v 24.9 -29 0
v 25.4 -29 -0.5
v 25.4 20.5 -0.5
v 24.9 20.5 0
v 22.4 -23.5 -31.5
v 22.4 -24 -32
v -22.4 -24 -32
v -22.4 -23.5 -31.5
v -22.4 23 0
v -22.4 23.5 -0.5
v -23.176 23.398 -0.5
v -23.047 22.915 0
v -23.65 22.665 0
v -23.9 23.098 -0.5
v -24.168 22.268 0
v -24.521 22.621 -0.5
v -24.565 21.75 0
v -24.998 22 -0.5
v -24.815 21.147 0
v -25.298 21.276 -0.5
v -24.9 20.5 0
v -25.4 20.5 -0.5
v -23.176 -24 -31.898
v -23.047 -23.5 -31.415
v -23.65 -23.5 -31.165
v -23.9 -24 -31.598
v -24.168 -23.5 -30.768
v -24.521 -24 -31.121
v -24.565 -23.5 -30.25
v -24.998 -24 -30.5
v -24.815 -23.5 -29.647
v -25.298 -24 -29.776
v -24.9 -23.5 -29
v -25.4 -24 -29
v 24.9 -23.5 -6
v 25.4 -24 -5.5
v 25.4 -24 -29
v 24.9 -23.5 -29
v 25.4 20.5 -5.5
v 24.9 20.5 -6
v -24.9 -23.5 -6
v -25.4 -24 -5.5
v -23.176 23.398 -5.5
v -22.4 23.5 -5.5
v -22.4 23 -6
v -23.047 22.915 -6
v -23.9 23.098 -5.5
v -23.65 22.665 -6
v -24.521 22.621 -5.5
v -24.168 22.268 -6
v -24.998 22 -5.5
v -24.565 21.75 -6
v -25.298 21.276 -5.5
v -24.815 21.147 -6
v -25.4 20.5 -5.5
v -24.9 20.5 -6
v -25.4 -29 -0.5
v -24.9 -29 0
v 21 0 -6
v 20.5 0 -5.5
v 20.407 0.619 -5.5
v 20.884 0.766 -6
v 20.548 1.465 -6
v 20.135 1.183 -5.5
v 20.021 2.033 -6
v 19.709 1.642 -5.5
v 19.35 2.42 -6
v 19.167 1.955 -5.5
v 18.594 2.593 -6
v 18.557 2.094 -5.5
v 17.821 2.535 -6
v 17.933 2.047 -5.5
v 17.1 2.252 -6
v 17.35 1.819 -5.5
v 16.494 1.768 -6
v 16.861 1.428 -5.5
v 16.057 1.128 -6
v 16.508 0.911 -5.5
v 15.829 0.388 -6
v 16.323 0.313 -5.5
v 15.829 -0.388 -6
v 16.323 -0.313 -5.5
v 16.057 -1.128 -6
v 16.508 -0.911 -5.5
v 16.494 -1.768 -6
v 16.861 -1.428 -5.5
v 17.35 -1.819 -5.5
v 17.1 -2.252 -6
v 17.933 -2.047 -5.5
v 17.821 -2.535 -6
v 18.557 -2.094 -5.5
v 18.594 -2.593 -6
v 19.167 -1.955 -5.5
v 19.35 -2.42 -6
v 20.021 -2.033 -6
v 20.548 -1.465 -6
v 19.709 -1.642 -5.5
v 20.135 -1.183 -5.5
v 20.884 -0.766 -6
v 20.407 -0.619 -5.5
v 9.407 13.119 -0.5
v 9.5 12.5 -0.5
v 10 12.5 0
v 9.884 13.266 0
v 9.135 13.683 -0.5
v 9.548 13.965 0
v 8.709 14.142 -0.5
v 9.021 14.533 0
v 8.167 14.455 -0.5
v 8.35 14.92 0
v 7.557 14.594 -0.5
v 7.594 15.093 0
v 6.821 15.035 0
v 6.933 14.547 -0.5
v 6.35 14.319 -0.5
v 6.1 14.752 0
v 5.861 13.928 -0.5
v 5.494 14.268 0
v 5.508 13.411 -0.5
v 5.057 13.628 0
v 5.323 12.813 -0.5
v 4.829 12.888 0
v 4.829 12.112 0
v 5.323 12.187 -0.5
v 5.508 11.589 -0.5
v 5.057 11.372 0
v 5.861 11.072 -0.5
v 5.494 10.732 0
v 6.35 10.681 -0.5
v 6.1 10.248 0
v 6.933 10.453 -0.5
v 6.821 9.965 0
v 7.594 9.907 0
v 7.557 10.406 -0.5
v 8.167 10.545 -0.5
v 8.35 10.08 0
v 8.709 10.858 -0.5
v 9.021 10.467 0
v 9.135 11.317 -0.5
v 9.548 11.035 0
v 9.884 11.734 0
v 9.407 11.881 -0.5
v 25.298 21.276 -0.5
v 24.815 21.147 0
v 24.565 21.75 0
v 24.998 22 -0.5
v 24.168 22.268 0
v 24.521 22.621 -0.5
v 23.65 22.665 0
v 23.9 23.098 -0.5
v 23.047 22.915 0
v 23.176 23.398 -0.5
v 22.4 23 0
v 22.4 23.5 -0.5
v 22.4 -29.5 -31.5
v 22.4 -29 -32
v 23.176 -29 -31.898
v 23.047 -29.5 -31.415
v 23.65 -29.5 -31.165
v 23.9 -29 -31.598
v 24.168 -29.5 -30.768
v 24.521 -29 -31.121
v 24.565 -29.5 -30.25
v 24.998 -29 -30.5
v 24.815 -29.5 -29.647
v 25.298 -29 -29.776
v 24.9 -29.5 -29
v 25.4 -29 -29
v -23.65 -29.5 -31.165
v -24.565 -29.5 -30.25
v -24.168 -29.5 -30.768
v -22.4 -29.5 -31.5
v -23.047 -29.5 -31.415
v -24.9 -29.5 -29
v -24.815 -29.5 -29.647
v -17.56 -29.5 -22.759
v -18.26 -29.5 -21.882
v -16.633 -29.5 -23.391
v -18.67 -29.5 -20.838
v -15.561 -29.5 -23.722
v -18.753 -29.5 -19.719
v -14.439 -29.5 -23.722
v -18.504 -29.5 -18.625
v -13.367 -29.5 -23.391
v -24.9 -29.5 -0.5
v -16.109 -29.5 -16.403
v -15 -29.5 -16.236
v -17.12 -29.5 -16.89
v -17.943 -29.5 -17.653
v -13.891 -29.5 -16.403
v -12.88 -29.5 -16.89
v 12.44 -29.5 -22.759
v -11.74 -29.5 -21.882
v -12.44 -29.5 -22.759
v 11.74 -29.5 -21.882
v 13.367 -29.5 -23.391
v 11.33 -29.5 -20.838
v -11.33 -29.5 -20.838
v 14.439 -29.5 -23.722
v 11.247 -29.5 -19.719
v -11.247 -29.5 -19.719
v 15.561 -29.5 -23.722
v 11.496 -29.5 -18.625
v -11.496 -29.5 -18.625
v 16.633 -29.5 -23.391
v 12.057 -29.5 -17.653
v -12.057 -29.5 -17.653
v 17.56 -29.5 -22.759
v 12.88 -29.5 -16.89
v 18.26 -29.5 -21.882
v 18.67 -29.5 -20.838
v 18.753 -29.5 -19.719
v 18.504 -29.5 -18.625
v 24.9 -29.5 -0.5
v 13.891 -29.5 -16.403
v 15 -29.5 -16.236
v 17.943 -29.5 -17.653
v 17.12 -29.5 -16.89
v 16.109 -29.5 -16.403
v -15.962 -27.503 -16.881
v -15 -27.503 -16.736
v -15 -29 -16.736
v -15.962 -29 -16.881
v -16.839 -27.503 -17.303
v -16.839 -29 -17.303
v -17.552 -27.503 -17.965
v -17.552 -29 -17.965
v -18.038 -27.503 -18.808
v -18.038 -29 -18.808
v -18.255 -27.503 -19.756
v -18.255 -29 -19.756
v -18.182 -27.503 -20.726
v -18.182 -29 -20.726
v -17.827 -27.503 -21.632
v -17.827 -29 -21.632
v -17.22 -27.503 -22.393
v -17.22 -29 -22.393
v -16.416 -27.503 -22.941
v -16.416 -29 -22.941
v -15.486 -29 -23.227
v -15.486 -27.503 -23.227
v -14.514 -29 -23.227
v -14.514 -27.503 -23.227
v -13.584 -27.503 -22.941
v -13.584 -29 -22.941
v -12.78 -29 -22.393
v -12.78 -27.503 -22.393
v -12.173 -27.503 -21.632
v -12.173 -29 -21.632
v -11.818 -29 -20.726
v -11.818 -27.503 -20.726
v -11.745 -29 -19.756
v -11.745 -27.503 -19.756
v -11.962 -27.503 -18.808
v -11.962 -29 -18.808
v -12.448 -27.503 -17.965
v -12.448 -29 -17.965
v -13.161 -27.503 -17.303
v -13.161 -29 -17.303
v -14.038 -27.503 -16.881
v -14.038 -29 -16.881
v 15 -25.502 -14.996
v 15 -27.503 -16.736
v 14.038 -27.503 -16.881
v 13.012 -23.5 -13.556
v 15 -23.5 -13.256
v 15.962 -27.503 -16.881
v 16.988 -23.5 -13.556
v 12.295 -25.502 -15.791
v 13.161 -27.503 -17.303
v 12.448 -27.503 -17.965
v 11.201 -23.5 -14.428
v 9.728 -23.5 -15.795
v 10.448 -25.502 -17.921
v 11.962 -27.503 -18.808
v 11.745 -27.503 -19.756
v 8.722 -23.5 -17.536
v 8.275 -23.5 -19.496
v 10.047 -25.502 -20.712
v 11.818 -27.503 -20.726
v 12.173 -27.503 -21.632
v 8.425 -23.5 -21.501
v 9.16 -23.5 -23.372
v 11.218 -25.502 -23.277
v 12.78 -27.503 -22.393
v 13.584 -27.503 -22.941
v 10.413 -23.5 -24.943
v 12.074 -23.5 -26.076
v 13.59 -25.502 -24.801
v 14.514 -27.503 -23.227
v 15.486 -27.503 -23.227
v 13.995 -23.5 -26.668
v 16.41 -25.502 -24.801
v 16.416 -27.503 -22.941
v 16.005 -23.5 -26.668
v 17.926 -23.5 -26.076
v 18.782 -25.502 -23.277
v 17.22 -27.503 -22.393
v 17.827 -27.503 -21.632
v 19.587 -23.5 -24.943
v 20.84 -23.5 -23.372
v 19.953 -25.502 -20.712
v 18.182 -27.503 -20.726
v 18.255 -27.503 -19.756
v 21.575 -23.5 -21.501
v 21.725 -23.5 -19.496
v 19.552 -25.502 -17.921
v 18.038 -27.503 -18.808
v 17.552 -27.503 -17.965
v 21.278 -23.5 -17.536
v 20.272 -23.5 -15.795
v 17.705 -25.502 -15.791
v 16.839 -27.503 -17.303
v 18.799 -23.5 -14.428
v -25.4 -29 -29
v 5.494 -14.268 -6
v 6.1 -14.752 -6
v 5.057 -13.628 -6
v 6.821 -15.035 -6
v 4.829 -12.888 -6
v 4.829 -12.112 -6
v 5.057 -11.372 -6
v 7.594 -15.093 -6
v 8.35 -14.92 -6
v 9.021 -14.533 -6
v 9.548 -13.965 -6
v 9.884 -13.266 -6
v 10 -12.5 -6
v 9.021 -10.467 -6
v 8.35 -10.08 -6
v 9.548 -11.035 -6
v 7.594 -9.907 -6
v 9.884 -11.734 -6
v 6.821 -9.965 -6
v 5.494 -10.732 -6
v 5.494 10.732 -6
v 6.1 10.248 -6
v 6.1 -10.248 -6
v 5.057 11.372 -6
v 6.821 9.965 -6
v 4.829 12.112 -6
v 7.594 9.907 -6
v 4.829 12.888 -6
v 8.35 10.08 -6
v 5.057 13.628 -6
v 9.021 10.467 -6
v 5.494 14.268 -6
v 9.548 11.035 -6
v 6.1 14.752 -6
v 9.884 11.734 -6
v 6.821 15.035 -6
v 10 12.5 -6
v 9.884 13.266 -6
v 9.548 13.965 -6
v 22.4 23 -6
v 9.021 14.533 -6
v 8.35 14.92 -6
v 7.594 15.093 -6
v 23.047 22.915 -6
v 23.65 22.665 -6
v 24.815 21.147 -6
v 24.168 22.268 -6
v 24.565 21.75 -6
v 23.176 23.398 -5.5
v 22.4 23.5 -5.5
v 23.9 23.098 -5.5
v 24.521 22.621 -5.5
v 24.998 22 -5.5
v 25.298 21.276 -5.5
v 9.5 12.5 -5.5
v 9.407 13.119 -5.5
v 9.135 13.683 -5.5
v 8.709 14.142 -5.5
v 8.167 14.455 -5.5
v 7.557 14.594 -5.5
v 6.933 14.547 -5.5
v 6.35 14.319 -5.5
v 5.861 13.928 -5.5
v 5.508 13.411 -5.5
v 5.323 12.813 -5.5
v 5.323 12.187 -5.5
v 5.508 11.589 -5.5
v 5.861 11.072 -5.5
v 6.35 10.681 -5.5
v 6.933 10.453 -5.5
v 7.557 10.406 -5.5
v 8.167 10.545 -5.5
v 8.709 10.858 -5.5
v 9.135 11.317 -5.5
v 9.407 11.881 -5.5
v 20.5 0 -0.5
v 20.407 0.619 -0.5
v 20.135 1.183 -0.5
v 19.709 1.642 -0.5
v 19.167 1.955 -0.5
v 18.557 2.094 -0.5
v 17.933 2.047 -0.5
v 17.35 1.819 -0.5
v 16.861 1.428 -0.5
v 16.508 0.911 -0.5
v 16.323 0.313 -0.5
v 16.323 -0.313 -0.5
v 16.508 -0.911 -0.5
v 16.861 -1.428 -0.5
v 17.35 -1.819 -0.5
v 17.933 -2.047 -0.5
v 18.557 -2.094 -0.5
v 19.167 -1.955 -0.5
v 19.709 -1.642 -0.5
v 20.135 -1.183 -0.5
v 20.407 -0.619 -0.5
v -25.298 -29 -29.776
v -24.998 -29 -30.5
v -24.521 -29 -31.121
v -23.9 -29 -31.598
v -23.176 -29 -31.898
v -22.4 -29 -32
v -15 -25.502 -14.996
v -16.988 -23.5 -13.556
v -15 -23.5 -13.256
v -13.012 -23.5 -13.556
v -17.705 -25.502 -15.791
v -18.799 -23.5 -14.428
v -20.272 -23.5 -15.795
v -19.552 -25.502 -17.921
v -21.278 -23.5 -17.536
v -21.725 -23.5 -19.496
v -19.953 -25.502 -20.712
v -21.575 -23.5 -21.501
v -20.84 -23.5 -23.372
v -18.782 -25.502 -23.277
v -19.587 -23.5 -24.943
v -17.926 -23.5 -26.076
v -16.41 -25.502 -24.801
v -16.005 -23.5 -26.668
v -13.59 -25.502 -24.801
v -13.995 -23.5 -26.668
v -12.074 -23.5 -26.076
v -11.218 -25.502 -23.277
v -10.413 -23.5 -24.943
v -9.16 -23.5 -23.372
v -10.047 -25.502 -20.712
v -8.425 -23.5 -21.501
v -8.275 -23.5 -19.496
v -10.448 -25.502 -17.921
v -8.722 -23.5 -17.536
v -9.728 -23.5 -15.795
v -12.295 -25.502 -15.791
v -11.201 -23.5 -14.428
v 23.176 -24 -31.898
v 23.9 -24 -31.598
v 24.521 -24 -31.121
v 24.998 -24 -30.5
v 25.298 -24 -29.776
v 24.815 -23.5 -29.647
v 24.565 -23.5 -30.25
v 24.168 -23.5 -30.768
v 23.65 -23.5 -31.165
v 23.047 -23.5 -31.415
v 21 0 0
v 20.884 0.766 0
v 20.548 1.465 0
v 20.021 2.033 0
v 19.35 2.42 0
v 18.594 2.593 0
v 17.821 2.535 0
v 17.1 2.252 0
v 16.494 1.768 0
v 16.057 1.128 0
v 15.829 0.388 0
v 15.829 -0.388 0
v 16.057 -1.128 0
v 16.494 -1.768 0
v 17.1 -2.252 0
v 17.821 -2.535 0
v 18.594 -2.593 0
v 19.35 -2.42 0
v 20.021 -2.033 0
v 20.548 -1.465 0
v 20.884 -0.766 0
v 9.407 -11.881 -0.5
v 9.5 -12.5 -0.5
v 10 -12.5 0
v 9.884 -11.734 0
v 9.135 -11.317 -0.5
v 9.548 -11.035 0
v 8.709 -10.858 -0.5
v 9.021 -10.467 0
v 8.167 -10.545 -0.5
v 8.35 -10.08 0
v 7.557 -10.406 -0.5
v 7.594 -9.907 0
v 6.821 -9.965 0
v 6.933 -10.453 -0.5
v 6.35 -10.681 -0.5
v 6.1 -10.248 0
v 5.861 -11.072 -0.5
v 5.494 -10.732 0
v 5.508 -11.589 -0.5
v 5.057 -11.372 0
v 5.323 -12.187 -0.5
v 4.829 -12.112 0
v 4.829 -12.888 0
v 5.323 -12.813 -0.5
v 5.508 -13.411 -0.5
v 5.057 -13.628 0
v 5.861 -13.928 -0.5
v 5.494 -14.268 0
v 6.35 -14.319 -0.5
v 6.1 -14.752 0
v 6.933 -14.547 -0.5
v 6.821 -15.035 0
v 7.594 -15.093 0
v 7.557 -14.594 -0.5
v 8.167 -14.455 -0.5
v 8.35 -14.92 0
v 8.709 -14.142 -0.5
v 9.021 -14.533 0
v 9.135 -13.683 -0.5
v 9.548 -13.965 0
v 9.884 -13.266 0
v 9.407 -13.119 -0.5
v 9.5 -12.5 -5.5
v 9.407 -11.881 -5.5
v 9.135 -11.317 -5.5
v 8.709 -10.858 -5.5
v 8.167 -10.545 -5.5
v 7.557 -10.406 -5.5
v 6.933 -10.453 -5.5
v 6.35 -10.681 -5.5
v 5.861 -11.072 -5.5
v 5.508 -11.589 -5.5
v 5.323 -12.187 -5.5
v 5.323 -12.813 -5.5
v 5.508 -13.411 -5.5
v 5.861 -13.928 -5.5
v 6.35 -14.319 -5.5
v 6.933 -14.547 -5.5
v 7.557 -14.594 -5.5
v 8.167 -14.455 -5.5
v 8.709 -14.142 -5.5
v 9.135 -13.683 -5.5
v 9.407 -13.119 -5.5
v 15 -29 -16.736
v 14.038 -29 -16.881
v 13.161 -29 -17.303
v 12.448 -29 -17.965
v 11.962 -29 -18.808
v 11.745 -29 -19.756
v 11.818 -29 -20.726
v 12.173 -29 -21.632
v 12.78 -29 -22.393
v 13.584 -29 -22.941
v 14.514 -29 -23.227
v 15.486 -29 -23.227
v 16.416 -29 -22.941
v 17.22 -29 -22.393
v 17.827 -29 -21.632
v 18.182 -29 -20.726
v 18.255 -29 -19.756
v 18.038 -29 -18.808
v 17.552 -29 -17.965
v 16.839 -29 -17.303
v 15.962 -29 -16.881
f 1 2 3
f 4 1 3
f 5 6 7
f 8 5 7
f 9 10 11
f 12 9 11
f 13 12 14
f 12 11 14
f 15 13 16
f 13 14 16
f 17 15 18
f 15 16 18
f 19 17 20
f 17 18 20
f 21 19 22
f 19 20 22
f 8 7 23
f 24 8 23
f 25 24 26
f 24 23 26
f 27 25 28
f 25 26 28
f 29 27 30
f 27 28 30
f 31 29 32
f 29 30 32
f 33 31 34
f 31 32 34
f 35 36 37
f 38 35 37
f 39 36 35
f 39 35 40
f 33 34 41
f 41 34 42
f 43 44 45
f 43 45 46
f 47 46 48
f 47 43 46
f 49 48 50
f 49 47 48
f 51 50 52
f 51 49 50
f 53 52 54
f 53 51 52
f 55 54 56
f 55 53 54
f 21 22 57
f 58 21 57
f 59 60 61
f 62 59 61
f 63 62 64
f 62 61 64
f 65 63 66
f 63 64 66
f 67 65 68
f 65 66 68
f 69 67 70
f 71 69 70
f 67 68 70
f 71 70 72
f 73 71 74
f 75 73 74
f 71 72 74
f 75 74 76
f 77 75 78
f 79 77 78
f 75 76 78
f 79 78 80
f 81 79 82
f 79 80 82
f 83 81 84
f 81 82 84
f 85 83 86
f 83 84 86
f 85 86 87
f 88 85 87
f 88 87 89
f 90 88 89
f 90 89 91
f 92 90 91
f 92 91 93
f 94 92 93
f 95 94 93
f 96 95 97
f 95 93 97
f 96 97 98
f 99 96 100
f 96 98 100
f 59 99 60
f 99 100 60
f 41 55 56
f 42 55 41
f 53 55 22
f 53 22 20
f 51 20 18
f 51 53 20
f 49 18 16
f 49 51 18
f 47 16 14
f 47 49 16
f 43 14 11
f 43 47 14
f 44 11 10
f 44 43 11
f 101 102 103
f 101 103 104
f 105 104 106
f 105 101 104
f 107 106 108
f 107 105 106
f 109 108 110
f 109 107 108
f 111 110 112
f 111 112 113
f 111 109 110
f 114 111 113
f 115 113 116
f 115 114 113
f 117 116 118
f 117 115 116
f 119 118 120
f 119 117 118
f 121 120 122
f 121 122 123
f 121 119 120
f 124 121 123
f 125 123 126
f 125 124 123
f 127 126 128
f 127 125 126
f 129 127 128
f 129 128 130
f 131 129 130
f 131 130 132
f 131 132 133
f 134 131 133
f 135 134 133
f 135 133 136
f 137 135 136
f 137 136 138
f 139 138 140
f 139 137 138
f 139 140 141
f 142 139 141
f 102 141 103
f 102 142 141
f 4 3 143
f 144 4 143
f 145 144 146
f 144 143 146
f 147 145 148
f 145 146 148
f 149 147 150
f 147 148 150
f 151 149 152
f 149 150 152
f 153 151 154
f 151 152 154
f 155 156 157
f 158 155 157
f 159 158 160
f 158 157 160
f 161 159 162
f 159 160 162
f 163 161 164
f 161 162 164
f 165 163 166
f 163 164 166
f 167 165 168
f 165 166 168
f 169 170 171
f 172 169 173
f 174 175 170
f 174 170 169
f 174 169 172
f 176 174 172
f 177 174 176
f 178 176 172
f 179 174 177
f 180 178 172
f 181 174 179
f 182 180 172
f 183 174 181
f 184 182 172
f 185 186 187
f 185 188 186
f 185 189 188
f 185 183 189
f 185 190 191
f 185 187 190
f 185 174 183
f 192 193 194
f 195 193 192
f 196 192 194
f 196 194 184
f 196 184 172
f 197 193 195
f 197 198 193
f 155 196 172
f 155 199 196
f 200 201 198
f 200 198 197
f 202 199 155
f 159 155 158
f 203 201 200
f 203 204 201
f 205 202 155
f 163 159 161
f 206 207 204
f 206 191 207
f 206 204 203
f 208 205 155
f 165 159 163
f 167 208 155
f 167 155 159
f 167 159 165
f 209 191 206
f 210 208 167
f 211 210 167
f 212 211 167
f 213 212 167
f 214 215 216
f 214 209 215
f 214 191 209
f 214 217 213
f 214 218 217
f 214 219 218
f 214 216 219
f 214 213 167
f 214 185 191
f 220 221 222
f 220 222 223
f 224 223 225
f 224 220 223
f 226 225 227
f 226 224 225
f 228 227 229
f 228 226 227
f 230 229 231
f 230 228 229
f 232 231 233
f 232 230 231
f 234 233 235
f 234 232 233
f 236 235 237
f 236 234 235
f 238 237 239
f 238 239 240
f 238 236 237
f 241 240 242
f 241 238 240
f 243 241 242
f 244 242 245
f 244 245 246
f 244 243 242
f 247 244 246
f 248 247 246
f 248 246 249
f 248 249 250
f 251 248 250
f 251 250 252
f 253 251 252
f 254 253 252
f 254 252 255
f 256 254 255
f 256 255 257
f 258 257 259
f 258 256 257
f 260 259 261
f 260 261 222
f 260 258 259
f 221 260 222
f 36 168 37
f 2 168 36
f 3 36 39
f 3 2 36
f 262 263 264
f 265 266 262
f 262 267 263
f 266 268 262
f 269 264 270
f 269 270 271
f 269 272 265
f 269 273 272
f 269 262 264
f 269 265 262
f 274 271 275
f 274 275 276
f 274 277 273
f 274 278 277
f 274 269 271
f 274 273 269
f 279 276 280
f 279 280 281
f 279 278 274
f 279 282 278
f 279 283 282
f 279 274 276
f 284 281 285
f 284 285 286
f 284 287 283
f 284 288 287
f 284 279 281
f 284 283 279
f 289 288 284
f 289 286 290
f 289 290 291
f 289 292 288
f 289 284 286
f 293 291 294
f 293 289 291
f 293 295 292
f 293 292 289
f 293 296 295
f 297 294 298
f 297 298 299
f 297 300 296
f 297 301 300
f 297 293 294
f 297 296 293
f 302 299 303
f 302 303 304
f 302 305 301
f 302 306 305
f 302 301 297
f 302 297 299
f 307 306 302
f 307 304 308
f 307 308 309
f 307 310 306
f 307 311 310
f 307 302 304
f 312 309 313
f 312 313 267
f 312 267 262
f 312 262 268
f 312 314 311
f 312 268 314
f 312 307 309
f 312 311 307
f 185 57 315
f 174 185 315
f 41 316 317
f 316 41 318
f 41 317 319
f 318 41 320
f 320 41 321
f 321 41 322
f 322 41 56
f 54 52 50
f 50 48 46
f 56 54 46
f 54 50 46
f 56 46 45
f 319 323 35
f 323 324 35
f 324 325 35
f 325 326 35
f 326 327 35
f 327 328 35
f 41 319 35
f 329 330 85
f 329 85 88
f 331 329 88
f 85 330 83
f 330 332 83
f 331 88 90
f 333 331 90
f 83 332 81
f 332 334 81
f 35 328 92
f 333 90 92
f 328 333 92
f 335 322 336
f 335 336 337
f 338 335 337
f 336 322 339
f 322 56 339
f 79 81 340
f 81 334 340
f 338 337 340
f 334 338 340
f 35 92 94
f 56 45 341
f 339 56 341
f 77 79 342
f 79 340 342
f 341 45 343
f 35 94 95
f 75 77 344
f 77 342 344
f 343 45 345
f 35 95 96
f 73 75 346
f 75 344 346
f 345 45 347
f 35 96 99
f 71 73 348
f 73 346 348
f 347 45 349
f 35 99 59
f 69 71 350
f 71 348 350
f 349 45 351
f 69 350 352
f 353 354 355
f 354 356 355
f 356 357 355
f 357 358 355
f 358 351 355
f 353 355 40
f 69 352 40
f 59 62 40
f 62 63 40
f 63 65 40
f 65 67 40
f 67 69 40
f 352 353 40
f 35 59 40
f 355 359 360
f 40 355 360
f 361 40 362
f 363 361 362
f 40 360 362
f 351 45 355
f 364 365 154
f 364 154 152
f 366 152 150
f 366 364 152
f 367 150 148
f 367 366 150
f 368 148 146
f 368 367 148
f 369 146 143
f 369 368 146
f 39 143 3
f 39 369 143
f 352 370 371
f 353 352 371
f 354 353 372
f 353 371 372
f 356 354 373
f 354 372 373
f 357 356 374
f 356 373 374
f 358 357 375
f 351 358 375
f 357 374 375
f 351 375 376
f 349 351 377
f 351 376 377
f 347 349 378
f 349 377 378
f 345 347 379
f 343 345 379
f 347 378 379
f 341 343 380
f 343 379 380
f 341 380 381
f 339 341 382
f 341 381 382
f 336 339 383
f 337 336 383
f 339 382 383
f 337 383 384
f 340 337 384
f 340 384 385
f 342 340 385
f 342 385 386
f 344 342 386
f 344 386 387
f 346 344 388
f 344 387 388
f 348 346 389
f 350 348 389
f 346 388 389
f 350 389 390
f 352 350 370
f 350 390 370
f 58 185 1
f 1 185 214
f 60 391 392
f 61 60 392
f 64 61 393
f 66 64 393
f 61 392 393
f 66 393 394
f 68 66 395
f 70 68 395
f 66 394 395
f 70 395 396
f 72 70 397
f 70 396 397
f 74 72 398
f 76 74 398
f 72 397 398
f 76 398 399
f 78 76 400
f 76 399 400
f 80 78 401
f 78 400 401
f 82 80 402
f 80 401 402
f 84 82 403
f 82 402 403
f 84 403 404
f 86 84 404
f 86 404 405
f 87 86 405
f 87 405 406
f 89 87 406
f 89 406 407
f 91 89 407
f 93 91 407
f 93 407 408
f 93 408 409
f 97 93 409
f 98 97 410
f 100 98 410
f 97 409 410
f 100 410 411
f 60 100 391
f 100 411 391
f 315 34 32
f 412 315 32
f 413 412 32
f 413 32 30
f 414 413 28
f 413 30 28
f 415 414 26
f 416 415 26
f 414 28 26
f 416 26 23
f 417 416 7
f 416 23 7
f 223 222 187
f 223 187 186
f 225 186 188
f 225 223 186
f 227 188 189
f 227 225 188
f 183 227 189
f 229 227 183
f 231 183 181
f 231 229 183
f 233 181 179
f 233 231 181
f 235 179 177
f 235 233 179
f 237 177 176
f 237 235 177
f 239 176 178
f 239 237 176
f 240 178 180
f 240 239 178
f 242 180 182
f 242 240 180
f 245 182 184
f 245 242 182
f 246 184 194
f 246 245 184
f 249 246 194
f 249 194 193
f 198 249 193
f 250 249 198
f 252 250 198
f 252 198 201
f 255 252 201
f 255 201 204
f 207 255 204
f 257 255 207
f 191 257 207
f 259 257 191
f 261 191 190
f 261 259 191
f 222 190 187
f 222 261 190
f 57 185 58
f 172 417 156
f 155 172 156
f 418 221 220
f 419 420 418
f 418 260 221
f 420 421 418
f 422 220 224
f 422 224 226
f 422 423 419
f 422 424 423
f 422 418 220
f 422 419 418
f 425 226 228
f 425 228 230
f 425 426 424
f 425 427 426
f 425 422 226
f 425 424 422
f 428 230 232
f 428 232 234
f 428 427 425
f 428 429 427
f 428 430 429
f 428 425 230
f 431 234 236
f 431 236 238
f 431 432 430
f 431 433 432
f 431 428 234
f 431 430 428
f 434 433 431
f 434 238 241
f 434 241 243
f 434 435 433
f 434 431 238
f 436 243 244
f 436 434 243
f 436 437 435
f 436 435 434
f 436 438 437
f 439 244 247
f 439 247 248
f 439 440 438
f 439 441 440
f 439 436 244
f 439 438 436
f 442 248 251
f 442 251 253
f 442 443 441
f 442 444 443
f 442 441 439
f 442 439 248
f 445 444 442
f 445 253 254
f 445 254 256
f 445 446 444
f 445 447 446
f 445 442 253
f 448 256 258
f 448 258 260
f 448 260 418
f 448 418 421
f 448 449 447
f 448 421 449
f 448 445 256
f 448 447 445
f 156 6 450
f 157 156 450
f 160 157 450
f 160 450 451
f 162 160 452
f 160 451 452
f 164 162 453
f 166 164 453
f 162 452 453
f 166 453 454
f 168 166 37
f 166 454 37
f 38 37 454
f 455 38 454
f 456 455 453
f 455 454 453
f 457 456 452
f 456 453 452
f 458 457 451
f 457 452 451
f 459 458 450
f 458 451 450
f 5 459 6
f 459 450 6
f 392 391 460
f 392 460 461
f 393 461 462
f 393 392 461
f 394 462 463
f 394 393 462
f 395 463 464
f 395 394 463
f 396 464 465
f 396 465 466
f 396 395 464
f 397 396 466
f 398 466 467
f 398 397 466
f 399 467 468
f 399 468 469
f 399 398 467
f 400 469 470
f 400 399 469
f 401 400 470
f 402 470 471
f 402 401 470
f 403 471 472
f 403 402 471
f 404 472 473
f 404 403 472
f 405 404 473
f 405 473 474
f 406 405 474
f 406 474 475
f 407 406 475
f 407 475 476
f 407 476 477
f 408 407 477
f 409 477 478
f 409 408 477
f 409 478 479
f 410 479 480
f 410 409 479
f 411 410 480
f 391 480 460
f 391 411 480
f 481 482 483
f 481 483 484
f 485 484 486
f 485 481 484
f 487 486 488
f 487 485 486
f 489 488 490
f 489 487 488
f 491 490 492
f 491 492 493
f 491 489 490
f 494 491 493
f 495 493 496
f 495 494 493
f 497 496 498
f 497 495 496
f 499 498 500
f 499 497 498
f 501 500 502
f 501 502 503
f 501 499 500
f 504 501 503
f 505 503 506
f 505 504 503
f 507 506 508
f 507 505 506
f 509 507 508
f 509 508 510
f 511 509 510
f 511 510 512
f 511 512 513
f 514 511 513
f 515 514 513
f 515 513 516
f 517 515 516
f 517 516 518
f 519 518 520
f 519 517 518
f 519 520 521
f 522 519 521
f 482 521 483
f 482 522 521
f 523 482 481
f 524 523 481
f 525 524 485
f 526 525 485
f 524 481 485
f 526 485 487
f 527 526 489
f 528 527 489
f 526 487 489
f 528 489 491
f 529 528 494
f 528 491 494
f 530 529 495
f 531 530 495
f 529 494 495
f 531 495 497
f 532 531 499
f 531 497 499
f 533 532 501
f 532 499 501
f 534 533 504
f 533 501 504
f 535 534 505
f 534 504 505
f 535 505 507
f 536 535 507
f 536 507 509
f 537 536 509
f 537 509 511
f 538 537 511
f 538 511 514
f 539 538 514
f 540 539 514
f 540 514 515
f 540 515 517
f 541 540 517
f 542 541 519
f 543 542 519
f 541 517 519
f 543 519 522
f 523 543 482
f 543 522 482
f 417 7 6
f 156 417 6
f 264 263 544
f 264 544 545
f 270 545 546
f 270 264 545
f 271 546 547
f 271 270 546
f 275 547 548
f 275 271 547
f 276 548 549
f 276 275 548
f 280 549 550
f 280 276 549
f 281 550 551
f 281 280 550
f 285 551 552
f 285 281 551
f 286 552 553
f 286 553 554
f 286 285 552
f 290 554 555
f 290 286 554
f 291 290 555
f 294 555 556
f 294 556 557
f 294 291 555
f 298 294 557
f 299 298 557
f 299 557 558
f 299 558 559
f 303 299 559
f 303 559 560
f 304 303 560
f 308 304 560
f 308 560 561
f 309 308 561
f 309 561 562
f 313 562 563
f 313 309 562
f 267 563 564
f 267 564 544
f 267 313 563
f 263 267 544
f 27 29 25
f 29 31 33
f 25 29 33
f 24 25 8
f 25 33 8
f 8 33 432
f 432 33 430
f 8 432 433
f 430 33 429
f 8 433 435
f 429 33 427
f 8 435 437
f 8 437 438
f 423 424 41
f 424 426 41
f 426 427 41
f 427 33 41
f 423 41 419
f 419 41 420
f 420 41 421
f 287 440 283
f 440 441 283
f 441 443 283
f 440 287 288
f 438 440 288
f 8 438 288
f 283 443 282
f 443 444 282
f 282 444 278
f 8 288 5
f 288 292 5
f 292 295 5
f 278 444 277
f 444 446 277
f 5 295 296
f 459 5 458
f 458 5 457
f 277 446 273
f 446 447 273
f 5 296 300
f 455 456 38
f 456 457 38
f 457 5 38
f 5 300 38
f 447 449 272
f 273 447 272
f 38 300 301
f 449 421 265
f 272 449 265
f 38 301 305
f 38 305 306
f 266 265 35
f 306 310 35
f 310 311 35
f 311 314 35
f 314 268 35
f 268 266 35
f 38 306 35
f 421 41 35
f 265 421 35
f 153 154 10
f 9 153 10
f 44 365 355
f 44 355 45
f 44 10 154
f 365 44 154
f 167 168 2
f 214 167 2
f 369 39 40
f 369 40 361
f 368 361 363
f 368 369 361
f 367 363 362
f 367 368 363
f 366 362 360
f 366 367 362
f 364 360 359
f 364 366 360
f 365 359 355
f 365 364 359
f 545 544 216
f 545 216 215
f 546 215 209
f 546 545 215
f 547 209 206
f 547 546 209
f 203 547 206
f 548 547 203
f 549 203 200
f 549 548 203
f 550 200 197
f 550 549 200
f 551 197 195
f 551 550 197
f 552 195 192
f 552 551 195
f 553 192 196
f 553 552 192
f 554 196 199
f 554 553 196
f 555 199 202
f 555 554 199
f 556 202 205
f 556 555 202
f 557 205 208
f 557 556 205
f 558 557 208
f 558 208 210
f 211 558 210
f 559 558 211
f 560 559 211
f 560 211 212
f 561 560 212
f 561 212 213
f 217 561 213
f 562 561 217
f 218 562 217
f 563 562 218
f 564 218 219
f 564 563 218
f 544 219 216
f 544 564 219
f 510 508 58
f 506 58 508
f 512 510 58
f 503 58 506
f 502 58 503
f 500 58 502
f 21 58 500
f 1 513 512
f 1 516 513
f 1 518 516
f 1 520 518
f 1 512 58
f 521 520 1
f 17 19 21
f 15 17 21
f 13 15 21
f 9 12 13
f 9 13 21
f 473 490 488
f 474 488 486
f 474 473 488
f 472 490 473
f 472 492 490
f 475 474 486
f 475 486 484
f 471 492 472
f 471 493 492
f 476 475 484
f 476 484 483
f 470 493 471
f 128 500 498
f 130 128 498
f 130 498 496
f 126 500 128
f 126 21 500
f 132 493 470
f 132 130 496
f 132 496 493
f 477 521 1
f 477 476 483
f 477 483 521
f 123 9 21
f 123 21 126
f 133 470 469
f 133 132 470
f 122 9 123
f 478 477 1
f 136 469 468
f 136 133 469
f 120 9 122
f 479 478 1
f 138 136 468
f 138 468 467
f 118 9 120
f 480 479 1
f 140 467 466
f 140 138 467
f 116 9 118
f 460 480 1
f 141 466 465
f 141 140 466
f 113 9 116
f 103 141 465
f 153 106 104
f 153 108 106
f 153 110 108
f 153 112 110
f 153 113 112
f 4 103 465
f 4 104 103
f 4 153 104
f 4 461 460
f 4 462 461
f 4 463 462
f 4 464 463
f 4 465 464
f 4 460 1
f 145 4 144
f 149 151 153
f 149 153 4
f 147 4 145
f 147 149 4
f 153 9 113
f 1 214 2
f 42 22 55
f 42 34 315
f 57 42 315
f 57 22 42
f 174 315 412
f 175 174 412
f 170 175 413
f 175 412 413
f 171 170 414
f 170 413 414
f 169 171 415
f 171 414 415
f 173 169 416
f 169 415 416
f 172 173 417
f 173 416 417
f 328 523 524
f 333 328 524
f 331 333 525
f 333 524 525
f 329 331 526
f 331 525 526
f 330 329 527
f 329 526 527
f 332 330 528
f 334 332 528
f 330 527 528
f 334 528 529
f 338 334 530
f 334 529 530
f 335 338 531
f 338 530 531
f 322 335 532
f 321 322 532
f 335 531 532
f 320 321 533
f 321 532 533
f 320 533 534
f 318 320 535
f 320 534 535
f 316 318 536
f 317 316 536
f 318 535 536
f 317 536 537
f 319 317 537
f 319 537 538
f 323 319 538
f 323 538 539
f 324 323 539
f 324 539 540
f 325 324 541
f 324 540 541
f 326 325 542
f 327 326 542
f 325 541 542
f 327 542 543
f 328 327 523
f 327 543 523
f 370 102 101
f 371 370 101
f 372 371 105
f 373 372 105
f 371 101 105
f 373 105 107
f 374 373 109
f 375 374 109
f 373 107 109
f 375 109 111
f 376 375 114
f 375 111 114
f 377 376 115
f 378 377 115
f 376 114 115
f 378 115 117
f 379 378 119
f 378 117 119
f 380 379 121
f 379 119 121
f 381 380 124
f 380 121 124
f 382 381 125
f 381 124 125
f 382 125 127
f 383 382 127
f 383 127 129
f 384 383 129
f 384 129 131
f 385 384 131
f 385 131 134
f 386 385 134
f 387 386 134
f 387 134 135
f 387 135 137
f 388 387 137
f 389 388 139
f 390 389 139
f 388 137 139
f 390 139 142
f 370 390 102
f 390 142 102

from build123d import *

# Parameters (mm, degrees)
SKETCH1_W                                    = 50.8
SKETCH1_H                                    = 53
SKETCH1_R                                    = 2.1
BOSS_EXTRUDE1_DEPTH                          = 6
SKETCH1_5_W                                  = 50.8
SKETCH1_5_H                                  = 6
BOSS_EXTRUDE2_DEPTH                          = 32
CSK_FOR_1_4_FLAT_HEAD_SOCKET_CAP_SCR_2_COUNT = 2
CSK_FOR_1_4_FLAT_HEAD_SOCKET_CAP_SCR_2_PITCH = 30
FILLET1_R                                    = 3
CHAMFER1_SIZE                                = 0.5


with BuildPart() as part:
    # Sketch1 → Boss-Extrude1 (new body)
    with BuildSketch(Plane.XY):
        with Locations((0, -3)):
            Rectangle(SKETCH1_W, SKETCH1_H)
        with Locations((7.4, -12.5)):
            Circle(SKETCH1_R, mode=Mode.SUBTRACT)
        with Locations((18.4, 0)):
            Circle(SKETCH1_R, mode=Mode.SUBTRACT)
        with Locations((7.4, 12.5)):
            Circle(SKETCH1_R, mode=Mode.SUBTRACT)
    extrude(amount=-BOSS_EXTRUDE1_DEPTH)

    # Sketch1_5 → Boss-Extrude2 (add)
    with BuildSketch(Plane.XY):
        with Locations((0, -26.5)):
            Rectangle(SKETCH1_5_W, SKETCH1_5_H)
    extrude(amount=-BOSS_EXTRUDE2_DEPTH)

    # Sketch4 → CSK for 1_4 Flat Head Socket Cap Screw1 (revolve, cut)
    with BuildSketch(Plane(origin=(-15, -23.5, -20), x_dir=(0, 0, 1), z_dir=(1, 0, 0))):
        Polygon((0, 0), (0, 6), (3.2639, 6), (3.2639, 4.003051983), (6.7437, 0), align=None)
    csk_for_1_4_flat_head_socket_cap_screw1 = revolve(axis=Axis((-15, -17.15, -20), (0, -1, 0)), mode=Mode.SUBTRACT)

    # CSK for 1_4 Flat Head Socket Cap Scr 2: CSK for 1_4 Flat Head Socket Cap Screw1 ×2
    with Locations(*[(i * CSK_FOR_1_4_FLAT_HEAD_SOCKET_CAP_SCR_2_PITCH, 0, 0) for i in range(1, CSK_FOR_1_4_FLAT_HEAD_SOCKET_CAP_SCR_2_COUNT)]):
        add(csk_for_1_4_flat_head_socket_cap_screw1, mode=Mode.SUBTRACT)

    # Fillet1
    fillet1_edges = [part.edges().sort_by_distance(p)[0] for p in [
        (25.4, 23.5, -3),
        (-25.4, 23.5, -3),
        (25.4, -26.5, -32),
        (-25.4, -26.5, -32),
    ]]
    fillet(fillet1_edges, radius=FILLET1_R)

    # Chamfer1
    chamfer1_edges = [part.edges().sort_by_distance(p)[0] for p in [
        (-24.521320344, 22.621320344, 0),
        (-25.4, -4.5, 0),
        (25.4, -4.5, 0),
        (24.521320344, 22.621320344, 0),
        (0, 23.5, 0),
        (16.3, 0, 0),
        (5.3, -12.5, 0),
        (5.3, 12.5, 0),
        (-25.4, -1.5, -6),
        (-24.521320344, 22.621320344, -6),
        (0, 23.5, -6),
        (24.521320344, 22.621320344, -6),
        (25.4, -1.5, -6),
        (16.3, 0, -6),
        (5.3, -12.5, -6),
        (5.3, 12.5, -6),
        (0, -29.5, 0),
        (-25.4, -23.5, -17.5),
        (25.4, -23.5, -17.5),
        (0, -23.5, -32),
        (-24.521320344, -23.5, -31.121320344),
        (24.521320344, -23.5, -31.121320344),
        (-25.4, -29.5, -14.5),
        (-24.521320344, -29.5, -31.121320344),
        (0, -29.5, -32),
        (24.521320344, -29.5, -31.121320344),
        (25.4, -29.5, -14.5),
        (-15, -29.5, -23.2639),
        (15, -29.5, -23.2639),
    ]]
    chamfer(chamfer1_edges, length=CHAMFER1_SIZE)


solid = part.part
